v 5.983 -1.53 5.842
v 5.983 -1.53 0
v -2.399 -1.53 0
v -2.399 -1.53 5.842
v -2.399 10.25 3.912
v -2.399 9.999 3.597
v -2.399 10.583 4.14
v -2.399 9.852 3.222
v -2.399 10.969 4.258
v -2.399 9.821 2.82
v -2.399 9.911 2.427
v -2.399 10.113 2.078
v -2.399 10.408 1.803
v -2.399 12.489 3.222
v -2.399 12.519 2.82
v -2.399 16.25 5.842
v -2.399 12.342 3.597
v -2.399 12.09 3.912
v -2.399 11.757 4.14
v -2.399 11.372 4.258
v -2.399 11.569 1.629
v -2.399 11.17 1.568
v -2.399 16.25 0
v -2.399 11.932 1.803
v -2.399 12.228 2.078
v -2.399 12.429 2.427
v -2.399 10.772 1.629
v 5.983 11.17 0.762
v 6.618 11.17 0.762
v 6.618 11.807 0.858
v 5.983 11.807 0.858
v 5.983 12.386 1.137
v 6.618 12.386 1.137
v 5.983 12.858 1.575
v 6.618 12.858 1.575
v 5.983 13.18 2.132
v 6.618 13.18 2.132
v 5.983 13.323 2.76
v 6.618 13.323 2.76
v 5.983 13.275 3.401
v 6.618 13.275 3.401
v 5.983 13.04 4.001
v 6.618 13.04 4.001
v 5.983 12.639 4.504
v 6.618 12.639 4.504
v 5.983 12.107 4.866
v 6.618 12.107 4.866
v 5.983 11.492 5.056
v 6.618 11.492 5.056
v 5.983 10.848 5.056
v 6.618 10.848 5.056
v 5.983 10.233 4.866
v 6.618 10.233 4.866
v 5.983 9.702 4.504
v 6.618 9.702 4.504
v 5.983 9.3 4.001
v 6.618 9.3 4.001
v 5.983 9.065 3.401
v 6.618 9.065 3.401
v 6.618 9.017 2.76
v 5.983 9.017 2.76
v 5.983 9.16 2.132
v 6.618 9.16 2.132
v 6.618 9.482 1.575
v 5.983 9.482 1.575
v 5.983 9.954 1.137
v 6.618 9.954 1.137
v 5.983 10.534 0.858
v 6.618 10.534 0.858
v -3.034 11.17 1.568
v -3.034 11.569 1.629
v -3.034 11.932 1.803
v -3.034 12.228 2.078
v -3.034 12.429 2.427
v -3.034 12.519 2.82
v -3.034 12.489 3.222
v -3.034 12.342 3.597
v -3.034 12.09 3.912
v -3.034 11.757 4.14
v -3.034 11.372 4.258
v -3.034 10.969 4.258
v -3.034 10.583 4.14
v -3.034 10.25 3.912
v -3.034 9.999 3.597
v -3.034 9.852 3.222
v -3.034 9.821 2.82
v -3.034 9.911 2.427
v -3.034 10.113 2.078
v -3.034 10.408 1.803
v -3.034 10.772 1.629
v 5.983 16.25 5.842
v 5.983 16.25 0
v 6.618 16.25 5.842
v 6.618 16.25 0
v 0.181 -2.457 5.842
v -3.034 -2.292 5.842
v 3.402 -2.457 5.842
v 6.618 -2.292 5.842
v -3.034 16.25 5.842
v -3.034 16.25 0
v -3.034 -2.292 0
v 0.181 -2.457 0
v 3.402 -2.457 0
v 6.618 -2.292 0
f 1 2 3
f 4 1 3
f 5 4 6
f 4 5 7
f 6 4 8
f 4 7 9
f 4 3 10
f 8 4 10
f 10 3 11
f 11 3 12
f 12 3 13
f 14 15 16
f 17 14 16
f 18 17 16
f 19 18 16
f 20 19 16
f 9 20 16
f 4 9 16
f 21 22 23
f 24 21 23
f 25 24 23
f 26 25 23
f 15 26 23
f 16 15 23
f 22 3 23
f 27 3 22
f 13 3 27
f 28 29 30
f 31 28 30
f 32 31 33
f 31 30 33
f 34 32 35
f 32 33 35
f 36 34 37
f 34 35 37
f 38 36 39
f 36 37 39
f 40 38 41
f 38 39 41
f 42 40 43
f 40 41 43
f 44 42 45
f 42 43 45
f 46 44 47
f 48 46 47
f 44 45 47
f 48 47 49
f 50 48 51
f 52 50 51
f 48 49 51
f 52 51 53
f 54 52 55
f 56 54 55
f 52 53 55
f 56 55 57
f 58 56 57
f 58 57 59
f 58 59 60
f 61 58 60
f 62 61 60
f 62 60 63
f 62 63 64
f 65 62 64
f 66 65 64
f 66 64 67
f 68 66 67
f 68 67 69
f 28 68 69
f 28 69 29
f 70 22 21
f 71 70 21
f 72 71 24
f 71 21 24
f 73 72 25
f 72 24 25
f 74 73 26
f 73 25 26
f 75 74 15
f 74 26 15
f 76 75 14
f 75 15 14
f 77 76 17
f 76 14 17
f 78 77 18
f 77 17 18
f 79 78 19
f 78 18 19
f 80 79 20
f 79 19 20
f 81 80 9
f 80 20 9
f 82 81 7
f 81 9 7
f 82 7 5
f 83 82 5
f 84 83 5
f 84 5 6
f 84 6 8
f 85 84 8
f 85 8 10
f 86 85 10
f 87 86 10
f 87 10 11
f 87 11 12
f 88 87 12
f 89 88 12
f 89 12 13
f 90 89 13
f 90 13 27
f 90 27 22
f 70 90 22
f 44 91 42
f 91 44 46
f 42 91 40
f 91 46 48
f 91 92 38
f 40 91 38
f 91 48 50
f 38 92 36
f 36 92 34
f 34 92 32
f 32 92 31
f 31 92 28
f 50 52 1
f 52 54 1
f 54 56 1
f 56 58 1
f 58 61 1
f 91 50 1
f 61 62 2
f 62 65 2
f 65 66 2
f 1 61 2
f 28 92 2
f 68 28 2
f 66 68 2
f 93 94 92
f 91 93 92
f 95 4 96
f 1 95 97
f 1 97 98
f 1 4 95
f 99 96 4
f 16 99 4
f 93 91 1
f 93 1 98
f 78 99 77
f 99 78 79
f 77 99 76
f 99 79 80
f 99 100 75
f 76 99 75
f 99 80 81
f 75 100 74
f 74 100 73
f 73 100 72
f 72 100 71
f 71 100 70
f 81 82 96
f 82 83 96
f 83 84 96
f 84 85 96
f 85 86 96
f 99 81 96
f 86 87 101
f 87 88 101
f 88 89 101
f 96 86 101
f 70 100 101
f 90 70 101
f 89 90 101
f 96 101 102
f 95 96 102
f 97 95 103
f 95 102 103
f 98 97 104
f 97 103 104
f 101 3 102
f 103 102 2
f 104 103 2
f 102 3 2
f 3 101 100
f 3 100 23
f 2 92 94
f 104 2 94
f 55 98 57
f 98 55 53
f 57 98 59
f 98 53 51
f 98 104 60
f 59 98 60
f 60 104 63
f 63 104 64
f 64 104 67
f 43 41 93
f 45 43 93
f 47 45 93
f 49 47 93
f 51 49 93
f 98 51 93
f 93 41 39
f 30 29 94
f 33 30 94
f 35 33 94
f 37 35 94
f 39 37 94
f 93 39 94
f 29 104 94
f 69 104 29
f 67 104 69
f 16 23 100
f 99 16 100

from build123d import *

# Parameters (mm, degrees)
BOSS_EXTRUDE1_DEPTH       = 5.842
BOSS_EXTRUDE2_DEPTH       = 5.842
SKETCH19_R                = 2.159
CUT_EXTRUDE1_DEPTH        = 2.54
F_6_32_TAPPED_HOLE1_D     = 2.7051
F_6_32_TAPPED_HOLE1_DEPTH = 0.635


with BuildPart() as part:
    # Sketch1 → Boss-Extrude1 (new body)
    with BuildSketch(Plane.XY):
        Polygon((-3.034436618, 16.25018662), (-3.034436618, -2.29181338), (6.617563382, -2.29181338), (6.617563382, 16.25018662), (5.982563382, 16.25018662), (5.982563382, -1.52981338), (-2.399436618, -1.52981338), (-2.399436618, 16.25018662), align=None)
    extrude(amount=BOSS_EXTRUDE1_DEPTH)

    # Sketch15 → Boss-Extrude2 (add, through all)
    with BuildSketch(Plane.XY):
        with BuildLine():
            Line((6.617563382, -2.29181338), (-3.034436618, -2.29181338))
            ThreePointArc((-3.034436618, -2.29181338), (1.791563382, -2.477704159), (6.617563382, -2.29181338))
        make_face()
    extrude(amount=BOSS_EXTRUDE2_DEPTH)

    # Sketch19 → Cut-Extrude1 (cut)
    with BuildSketch(Plane(origin=(6.617563382, 0, 0), x_dir=(0, 0, -1), z_dir=(1, 0, 0))):
        with Locations((-2.921, 11.17018662)):
            Circle(SKETCH19_R)
    extrude(amount=-CUT_EXTRUDE1_DEPTH, mode=Mode.SUBTRACT)

    # #6-32 Tapped Hole1
    with Locations(Plane.ZY.offset(3.034436618)):
        with Locations((2.921, 11.17018662)):
            Hole(F_6_32_TAPPED_HOLE1_D / 2, depth=F_6_32_TAPPED_HOLE1_DEPTH)


solid = part.part
